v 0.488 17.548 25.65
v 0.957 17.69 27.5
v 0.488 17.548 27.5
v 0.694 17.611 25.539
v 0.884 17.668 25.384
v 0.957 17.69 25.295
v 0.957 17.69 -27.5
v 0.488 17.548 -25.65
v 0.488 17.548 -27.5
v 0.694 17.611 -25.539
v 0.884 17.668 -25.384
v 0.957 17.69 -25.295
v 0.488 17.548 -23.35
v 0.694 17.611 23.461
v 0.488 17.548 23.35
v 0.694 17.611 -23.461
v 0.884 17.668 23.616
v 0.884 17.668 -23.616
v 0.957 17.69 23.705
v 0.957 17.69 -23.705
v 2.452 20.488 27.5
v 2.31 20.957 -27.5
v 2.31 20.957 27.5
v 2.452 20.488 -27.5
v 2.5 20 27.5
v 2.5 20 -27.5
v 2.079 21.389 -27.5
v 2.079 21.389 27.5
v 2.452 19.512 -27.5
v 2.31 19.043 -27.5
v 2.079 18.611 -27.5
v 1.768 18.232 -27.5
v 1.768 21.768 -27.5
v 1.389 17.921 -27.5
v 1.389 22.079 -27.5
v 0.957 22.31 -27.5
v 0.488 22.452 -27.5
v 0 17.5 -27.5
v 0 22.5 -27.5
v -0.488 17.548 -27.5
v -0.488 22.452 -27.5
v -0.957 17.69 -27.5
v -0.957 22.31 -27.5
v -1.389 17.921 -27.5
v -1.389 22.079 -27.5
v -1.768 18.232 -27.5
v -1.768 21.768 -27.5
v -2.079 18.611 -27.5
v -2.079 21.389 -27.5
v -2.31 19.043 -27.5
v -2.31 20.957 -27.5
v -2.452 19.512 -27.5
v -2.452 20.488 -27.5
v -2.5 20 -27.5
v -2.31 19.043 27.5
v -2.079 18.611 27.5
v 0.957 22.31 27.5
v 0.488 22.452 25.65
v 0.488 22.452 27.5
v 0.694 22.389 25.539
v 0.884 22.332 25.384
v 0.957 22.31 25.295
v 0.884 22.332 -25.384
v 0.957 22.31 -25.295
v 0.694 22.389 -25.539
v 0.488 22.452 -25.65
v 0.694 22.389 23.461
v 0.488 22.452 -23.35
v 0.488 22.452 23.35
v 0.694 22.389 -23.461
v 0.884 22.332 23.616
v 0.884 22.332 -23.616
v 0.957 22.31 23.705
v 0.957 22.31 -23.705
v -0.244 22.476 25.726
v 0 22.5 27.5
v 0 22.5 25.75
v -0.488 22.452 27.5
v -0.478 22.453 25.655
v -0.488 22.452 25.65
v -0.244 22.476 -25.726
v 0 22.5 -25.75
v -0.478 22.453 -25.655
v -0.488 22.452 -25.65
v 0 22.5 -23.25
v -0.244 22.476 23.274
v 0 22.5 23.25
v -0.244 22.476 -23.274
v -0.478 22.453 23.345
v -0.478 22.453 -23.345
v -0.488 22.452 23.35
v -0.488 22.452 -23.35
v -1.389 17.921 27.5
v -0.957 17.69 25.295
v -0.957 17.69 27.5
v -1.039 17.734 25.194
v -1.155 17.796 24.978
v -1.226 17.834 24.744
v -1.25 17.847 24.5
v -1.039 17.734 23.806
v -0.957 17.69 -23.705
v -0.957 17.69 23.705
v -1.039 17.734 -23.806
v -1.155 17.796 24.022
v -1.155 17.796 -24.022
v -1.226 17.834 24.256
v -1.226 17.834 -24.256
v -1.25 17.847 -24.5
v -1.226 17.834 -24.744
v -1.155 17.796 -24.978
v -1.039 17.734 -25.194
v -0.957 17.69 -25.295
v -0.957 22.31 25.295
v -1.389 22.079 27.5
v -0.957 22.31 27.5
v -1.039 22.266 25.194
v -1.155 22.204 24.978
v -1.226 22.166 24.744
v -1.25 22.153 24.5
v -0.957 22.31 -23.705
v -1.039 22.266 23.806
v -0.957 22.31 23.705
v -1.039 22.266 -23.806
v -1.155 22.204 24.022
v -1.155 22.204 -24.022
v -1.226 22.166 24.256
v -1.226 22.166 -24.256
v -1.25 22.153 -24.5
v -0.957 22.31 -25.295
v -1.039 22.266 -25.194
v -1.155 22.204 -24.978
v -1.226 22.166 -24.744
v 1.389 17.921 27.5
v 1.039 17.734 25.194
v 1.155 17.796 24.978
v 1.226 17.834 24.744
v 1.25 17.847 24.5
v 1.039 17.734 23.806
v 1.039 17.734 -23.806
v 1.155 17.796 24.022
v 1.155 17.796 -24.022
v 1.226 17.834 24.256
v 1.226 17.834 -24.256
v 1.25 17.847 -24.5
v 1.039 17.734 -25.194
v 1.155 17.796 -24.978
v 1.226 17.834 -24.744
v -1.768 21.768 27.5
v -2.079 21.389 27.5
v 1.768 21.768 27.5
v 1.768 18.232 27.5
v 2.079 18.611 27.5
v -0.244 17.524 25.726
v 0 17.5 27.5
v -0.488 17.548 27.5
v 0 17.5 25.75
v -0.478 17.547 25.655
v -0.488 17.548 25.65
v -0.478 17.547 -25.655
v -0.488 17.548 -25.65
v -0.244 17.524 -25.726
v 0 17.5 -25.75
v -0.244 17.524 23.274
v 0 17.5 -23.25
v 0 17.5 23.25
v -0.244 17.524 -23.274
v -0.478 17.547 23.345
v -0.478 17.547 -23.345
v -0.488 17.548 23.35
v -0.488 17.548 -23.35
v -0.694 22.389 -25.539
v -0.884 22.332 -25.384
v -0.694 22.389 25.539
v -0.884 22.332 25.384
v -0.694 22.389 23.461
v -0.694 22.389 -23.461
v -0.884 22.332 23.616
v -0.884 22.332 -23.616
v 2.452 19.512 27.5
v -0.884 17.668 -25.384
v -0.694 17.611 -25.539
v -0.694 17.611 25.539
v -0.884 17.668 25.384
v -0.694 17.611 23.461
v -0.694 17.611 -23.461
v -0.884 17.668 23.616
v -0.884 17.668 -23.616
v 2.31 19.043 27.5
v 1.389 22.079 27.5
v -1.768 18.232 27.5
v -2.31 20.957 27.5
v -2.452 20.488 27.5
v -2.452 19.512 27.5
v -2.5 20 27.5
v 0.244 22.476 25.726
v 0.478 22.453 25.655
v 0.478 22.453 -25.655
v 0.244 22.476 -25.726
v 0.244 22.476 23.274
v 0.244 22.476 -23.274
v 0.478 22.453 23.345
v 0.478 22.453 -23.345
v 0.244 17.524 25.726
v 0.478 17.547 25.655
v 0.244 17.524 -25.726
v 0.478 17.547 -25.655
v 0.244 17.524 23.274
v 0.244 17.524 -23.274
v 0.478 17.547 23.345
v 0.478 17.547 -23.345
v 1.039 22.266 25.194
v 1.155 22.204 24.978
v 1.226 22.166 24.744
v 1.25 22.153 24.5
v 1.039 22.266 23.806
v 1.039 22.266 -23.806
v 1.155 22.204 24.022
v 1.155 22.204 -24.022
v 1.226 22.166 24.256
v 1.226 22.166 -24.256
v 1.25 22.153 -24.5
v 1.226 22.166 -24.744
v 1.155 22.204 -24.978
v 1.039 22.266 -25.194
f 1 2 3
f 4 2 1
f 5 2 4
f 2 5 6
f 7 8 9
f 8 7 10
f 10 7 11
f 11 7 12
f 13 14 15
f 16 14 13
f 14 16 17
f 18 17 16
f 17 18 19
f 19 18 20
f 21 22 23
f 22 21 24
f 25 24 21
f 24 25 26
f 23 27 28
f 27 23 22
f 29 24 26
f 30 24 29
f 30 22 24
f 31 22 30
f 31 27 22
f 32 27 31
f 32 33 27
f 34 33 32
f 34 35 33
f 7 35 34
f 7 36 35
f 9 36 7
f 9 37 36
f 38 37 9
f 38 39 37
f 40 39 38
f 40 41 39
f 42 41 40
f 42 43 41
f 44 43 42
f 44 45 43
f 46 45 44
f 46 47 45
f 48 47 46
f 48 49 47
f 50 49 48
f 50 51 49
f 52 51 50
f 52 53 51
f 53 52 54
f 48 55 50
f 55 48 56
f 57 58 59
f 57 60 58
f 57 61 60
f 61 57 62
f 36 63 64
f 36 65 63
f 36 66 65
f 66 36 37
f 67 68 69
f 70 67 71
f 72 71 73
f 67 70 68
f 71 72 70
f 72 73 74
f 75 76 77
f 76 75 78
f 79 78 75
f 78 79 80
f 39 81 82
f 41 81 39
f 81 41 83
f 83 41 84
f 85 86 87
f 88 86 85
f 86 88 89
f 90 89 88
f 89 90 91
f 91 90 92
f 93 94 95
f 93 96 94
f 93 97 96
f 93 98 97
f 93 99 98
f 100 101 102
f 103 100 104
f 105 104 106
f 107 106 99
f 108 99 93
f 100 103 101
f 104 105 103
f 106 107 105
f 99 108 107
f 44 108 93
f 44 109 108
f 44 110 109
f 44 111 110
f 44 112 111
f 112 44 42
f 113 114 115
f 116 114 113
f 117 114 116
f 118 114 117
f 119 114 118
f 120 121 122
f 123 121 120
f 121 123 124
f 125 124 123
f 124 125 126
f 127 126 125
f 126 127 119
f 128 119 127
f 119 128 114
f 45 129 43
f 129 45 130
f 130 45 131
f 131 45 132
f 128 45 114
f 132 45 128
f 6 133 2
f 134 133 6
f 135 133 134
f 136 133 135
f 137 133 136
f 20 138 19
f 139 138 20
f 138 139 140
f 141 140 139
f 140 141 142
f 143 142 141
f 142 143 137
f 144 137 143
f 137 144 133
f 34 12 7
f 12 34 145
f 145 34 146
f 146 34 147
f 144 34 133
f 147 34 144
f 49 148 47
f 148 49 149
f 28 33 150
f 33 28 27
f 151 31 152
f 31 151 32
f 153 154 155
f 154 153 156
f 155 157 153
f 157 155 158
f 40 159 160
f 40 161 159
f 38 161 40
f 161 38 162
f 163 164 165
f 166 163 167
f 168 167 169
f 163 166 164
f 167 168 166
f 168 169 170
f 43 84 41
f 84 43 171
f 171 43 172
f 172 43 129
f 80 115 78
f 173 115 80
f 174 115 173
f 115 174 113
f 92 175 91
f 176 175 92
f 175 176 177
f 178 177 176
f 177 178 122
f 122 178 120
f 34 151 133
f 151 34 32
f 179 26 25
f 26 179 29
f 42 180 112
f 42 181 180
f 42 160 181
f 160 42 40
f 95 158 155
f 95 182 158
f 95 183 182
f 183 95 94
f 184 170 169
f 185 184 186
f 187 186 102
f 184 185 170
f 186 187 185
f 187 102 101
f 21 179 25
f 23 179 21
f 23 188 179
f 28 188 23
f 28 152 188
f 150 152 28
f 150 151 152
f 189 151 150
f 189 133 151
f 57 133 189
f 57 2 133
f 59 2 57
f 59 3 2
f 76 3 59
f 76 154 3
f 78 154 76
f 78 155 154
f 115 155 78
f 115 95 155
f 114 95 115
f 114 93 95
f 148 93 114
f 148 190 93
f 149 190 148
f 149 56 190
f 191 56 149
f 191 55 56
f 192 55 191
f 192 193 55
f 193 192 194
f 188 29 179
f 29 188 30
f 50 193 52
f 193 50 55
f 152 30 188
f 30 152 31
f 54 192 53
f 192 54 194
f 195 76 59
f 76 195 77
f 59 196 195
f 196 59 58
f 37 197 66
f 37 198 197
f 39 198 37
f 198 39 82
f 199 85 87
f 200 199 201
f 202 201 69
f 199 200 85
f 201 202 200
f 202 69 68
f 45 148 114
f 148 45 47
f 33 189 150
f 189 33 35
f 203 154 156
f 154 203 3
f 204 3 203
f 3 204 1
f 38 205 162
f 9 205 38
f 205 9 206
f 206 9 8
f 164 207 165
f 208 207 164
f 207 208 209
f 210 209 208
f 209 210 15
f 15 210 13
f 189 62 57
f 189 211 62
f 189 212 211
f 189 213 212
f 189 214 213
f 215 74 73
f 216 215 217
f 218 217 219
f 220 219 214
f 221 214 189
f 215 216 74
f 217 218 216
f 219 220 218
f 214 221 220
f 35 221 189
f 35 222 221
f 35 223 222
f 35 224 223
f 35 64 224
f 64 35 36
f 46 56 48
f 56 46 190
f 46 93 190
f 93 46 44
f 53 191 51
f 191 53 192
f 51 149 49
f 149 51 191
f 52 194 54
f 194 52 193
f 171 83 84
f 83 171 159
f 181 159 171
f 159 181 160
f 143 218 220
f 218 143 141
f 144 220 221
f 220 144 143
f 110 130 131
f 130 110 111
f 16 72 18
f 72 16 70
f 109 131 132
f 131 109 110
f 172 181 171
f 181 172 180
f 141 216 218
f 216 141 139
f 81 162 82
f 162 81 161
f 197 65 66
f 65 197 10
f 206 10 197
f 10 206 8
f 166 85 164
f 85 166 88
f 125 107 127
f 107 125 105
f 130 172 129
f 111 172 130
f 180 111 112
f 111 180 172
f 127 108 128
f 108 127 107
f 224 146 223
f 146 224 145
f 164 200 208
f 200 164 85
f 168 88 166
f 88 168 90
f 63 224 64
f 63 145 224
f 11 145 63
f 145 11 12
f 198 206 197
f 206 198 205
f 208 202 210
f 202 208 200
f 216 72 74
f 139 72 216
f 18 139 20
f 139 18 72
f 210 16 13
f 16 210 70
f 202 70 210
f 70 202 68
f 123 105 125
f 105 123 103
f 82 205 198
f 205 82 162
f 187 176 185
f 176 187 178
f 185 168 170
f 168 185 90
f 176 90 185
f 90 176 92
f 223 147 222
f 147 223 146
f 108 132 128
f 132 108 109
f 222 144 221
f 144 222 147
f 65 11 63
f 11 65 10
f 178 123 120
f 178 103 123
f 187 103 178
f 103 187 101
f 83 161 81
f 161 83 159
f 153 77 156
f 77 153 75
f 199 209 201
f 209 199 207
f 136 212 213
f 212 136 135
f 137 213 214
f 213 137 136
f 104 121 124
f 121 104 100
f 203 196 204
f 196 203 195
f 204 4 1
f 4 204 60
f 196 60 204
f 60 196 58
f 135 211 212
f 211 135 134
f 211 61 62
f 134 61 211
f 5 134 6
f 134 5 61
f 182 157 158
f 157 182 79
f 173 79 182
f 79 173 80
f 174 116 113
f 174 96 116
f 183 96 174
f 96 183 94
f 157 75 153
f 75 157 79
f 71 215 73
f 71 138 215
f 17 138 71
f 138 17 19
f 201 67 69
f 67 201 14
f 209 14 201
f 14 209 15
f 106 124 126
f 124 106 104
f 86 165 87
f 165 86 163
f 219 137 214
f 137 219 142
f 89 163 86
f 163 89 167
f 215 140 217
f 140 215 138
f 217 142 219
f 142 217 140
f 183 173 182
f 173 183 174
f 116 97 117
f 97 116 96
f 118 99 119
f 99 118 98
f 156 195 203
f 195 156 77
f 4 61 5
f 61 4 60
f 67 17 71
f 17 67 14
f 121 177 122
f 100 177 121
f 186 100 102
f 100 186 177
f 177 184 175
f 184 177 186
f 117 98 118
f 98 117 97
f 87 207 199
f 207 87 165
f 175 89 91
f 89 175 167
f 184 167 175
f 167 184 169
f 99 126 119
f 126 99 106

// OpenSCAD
use <MCAD/involute_gears.scad>
use <Thread_Library_Throated.scad>

fn=32;
fs=0.9;
pitch = 150;
pin_d = 3.5;
module motor() {
    union() {
        cylinder(r=35.5/2, h=50, $fs= fs);
        cylinder(r=3.175/2, h=68, $fs= fs);
    }
}
module pinion() {
    $fs=1;
    difference() {
        union() {

            translate([0,0,9.5]) gear (number_of_teeth=15, circular_pitch=pitch,gear_thickness = 9,rim_thickness = 9,hub_thickness = 9,bore_diameter=pin_d,circles=0, $fs= fs);
            hollow_cyl(d=3.2, w=4, h=9.5);
        }
        translate([-10,0,9/2]) rotate([0,90,0]) cylinder(d=2.9, h=20);
    }
}
module gears_1() {
    union() {
    gear (number_of_teeth=49, circular_pitch=pitch,
        gear_thickness = 8,
        rim_thickness = 8,
        hub_thickness = 8,
        bore_diameter=pin_d,
        circles=2, $fs= fs);
    translate([0,0,8]) gear (number_of_teeth=15, circular_pitch=pitch,
        gear_thickness = 9,
        rim_thickness = 9,
        hub_thickness = 9,
        bore_diameter=pin_d,
        circles=2, $fs= fs);
    }    
}
module gears_2() {
    union() {
    gear (number_of_teeth=40, circular_pitch=pitch,
        gear_thickness = 8,
        rim_thickness = 8,
        hub_thickness = 8,
        bore_diameter=pin_d,
        circles=6, $fs= fs);
    translate([0,0,8]) gear (number_of_teeth=15, circular_pitch=pitch,
        gear_thickness = 9+6,
        rim_thickness = 9+6,
        hub_thickness = 9+6,
        bore_diameter=pin_d,
        circles=2, $fs= fs);
    }    
}
module gears_3() {
    union() {
    gear (number_of_teeth=40, circular_pitch=pitch,
        gear_thickness = 8,
        rim_thickness = 8,
        hub_thickness = 8,
        bore_diameter=pin_d,
        circles=2, $fs= fs);
    translate([0,0,8]) gear (number_of_teeth=15, circular_pitch=pitch,
        gear_thickness = 17,
        rim_thickness = 17,
        hub_thickness = 17,
        bore_diameter=pin_d,
        circles=2, $fs= fs);
    }    
}
module diffgear() {
    difference() {
        gear (number_of_teeth=40, circular_pitch=pitch,        gear_thickness = 16,        rim_thickness = 16,        hub_thickness = 16,        bore_diameter=6.2,        circles=0, $fn=fn);
        diff_arms_cut();
    }
}
module pinholder() {
    difference() {
        cylinder(d=pin_d+5, h=4, $fn=fn);
        cylinder(d=pin_d, h=4, $fn=fn);
    }
    
}
module pinholder_cut() {
    
        translate([0,0,-0.5]) cylinder(d=pin_d, h=5, $fn=fn);

    
}
module pinholder_cut_6() {
        translate([0,0,-0.5]) cylinder(d=6, h=5, $fn=fn);
}
module Bholder() {
    difference() {
        cylinder(d=15+4, h=4, $fn=fn);
        cylinder(d=15, h=4, $fn=fn);
    }
    
}
module Bholder_cut() {
    
        cylinder(d=15, h=4, $fn=fn);

    
}
avst = 16.6667+6.25;
avst2 = 20.4167+6.25;
module all_gears() {
avst = 16.6667+6.25;
avst2 = 20.4167+6.25;

%translate([0,0,-8]) gear (number_of_teeth=15, circular_pitch=pitch,
        gear_thickness = 8,
        rim_thickness = 8,
        hub_thickness = 8,
        bore_diameter=3.175,
        circles=2, $fn=fn);

translate([avst2,0,0]) rotate([0,180,0]) gears_1(); // /3.333 // gear1
translate([avst2,avst,-9])rotate([0,180,0]) gears_2(); // 8.66 // gear2
translate([avst2,avst,-9-9-5]) rotate([0,180,-45]) translate([avst,0,0]) gears_3();   // 22.5
translate([avst2-avst,avst,-9-9-9-5]) rotate([0,180,-45]) translate([avst,0,0]) diffgear();                           // 58.5866666667 

//translate([avst2-avst,avst,-9-9-9-5 +55/2 -16/2]) rotate([0,180,-45]) translate([avst,0,0]) %cylinder(d=10, h = 55);
    
    translate([avst2-avst,avst,-9-9-9-5 +6.1 -16/2]) rotate([0,180,-45]) translate([avst,0,0]) rotate([0,180,0]) diff_arms();
    translate([avst2-avst,avst,-9-9-9-5 -6.1-2 -16/2]) rotate([0,180,-45]) translate([avst,0,0]) rotate([0,0,0]) diff_arms();
}
module holder() {
    $fs= 0.9;
    //baseplate
    difference() {
        translate([5,55,-60]) cube([25,3,65]);
        //material saving
        //translate([15,200,-(17-4)/2]) rotate([90,0,0]) cylinder(d=17-4, h=400); 
        //translate([15,200,-(50-4)/2-(17-4)/2-2]) rotate([90,0,0]) cylinder(d=50-4-17-4, h=400);
        translate([avst2,avst,-9-9-4]) rotate([0,180,-45]) translate([avst,0,0]) cylinder(r= 16.6667+1.5, h= 10);
    }
    hull() {
        translate([1.5,55-25,-60-2.5+1]) cube([1.5,25+3,1.5]);
        translate([7,55-25,-53]) cube([1.5,25+3,1.5]);
    }
    translate([-4.5,53,-66]) cube([8,5,6]);
    translate([-4.5,53,-20]) cube([8,5,6]);
    p1off = 0;
    difference() {
        hull() {
            translate([avst2,0,0])pinholder();
            translate([avst2,avst,0])pinholder();
            //translate([avst2,avst,0+4]) rotate([0,180,-45]) translate([avst,0,0]) pinholder();
            translate([0,55,0]) cube([30,3,4]);
        
        }
        translate([avst2,0,0])pinholder_cut();
        translate([avst2,avst,0])pinholder_cut();
        translate([avst2,avst,0+4]) rotate([0,180,-45]) translate([avst,0,0]) pinholder_cut_6();
    }
    p2off = 22;
    difference() {
        hull() {
            translate([avst2,0,-22])pinholder();
            translate([avst2,avst,-22+4]) rotate([0,180,-45]) translate([avst,0,0]) pinholder();
            //translate([avst2-avst,avst,-22+4]) rotate([0,180,-45]) translate([avst,0,0]) Bholder();

            translate([0,55,-22]) cube([30,3,4]);
            translate([0,0,-22]) cylinder(d=35, h=4);
        }
        translate([avst2,0,-22])pinholder_cut();
        translate([avst2,avst,-22+4]) rotate([0,180,-45]) translate([avst,0,0]) pinholder_cut();
        //translate([avst2-avst,avst,-22+4]) rotate([0,180,-45]) translate([avst,0,0]) Bholder_cut();
        translate([0,0,-22]) motor_cut();
        hull() {
            translate([avst2,avst,-22+4])rotate([0,180,0]) cylinder(d=18, h=4);
            translate([avst2+25,avst,-22+4])rotate([0,180,0]) cylinder(d=18, h=4);
        }
        translate([avst2-avst,avst,-p2off+2]) rotate([0,180,-45]) translate([avst,0,0]) cylinder(d=30, h=3);
        translate([avst2-avst,avst,-p2off+5]) rotate([0,180,-45]) translate([avst,0,0]) cylinder(d=15.5+3*2, h=3);
        // screw mount cuts
        translate([avst2-avst,avst,-60+46]) rotate([0,180,-45]) translate([avst,0,0]) rotate([0,0,-45-180]) mount2_gb_cut();
    translate([avst2-avst,avst,-60+46]) rotate([0,180,-45]) translate([avst,0,0]) rotate([0,0,-45-180]) mirror([0,1,0]) mount2_gb_cut();
        
    }
    p3off = 37;
    difference() {
        hull() {
            //translate([avst2,0,0])pinholder();
            translate([avst2,avst,-37])pinholder();
            //translate([avst2,avst,0+4]) rotate([0,180,-45]) translate([avst,0,0]) pinholder();
            translate([17,55,-37]) cube([13,3,4]);
        
        }
        translate([avst2,0,-37])pinholder_cut();
        translate([avst2,avst,-37])pinholder_cut();
        //translate([avst2,avst,0+4]) rotate([0,180,-45]) translate([avst,0,0]) pinholder_cut();
    }
    p4off = 53;
    difference() {
        hull() {
            //translate([avst2,0,-p4off])pinholder();
            //translate([avst2,avst,-p4off])pinholder();
            translate([avst2,avst,-p4off+4]) rotate([0,180,-45]) translate([avst,0,0]) pinholder();
            //translate([avst2-avst,avst,-p4off+4]) rotate([0,180,-45]) translate([avst,0,0]) Bholder();
            translate([10,55,-p4off]) cube([20,3,4]);
        }
        translate([avst2,0,-p4off])pinholder_cut();
        translate([avst2,avst,-p4off])pinholder_cut();
        translate([avst2,avst,-p4off+4]) rotate([0,180,-45]) translate([avst,0,0]) pinholder_cut();
        //translate([avst2-avst,avst,-p4off+4]) rotate([0,180,-45]) translate([avst,0,0]) Bholder_cut();
        //translate([0,0,-100]) cylinder(d=40, h=200);
    }
    
    // screw mounts
    translate([avst2-avst,avst,-60+46]) rotate([0,180,-45]) translate([avst,0,0]) rotate([0,0,-45-180]) mount2_gb();
    translate([avst2-avst,avst,-60+46]) rotate([0,180,-45]) translate([avst,0,0]) rotate([0,0,-45-180]) mirror([0,1,0]) mount2_gb();
    
    translate([avst2-avst,avst,-60]) rotate([0,180,-45]) translate([avst,0,0]) rotate([0,0,-45-180]) mount2_gb();
    translate([avst2-avst,avst,-60]) rotate([0,180,-45]) translate([avst,0,0]) rotate([0,0,-45-180]) mirror([0,1,0]) mount2_gb();
    
}
module motor_cut() {
    $fs= 0.9;
    rotate([0,0,0]) translate([0,0,0])  union() {
        translate([0,-25/2,0]) cylinder(d=3, h=4, $fn=32);
        translate([0,25/2,0]) cylinder(d=3, h=4, $fn=32);
        hull() {
            translate([0,0,0]) cylinder(d=13, h=4);
            //translate([10,1.5+25/2,0]) cylinder(d=13, h=4);
        }
    }
}


module sakura_axle() {
    $fs= 0.9;
    sphere(d=6);
    translate([0,5,0]) rotate([90,0,0]) cylinder(d=2, h=10);
    cylinder(d=3.15, h=44);
    translate([0,5,44]) rotate([90,0,0]) cylinder(d=2, h=10);
    translate([0,0,44]) cylinder(d=10, h=3);
    translate([0,0,44+3]) cylinder(d1=10, d2=7, h=1.5);
    translate([0,5,44+15.5]) rotate([90,0,0]) cylinder(d=2, h=10);
    translate([0,0,44]) cylinder(d=5, h=17.5);
    translate([0,0,44]) cylinder(d=3,85, h=30);
}
module hollow_cyl(d, w, h) {
    $fs= 0.9;
    difference() {
        cylinder(d=d+w*2, h=h);
        translate([0,0,-1])cylinder(d=d, h=h+2);
    }
}
module hollow_cyl2(d1, d2, w, h) {
    $fs= 0.9;
    difference() {
        cylinder(d1=d1+w*2, d2=d2+w*2, h=h);
        translate([0,0,0])cylinder(d1=d1,d2=d2, h=h);
        //translate([0,0,-1])cylinder(d=d2, h=h+2);
    }
}
module hollow_cyl3(d1, d2, w, h) {
    $fs= 0.9;
    difference() {
        cylinder(d1=d1+w*2, d2=d2+w*2, h=h);
        
        translate([0,0,-1]) cylinder(d=d2, h=h+2);
    }
}
module mount() {
    $fs= 0.9;
    x = 8;
    y= 15;
    z = 4;
    $fs= 0.9;
    difference() {
        cube([x,y,z]);
        translate([x/2,y-3,-1]) cylinder(d=3,h=z+2);
        translate([0,0,-1]) cylinder(d=12,h=z+2);
    }
}
module mount2() {
    $fs= 0.9;
    x = 8;
    y= 15;
    z = 6;
    $fs= 0.9;
    difference() {
        cube([x,y,z]);
        translate([0,y-3,z/2]) rotate([0,90,0]) cylinder(d=3,h=z+2);
        translate([0,0,-1]) cylinder(d=16,h=z+2);
    }
}
module mount2_gb() {
    $fs= 0.9;
    x = 8;
    y= 15;
    z = 6;
    $fs= 0.9;
    difference() {
        translate([x,0,0]) cube([x,y,z]);
        translate([x,y-3,z/2]) rotate([0,90,0]) cylinder(d=3,h=z+3);
        translate([0,0,-1]) cylinder(d=15.5+3*2+0,h=z+2);
    }
}
module mount2_gb_cut() {
    x = 8;
    y= 15;
    z = 6;
    $fs= 0.9;

    translate([x,y-3,z/2]) rotate([0,90,0]) cylinder(d=3,h=z+2+20);
    translate([x,y-3,z/2]) rotate([0,90,0]) cylinder(d=6,h=z+2+10);

}
//mount();
module axle1() {
    $fs= 0.9;
    hollow_cyl(d=38, h=10, w=3);
    translate([0,0,10]) hollow_cyl2(d1=38, d2=15, h=10, w=3);
    translate([0,0,20-2]) hollow_cyl3(d1=15,d2=12, h=2, w=3);
    color("red") translate([0,0,20]) hollow_cyl(d=15.5, h=4.5, w=3);
    translate([0,0,20+4.5]) hollow_cyl3(d1=15,d2=12, h=4.5, w=3);
    difference() {
        translate([0,0,20+4.5+4.5]) hollow_cyl(d=12, h=30, w=3);
        translate([-50,0,20+4.5+4.5+30-5]) rotate([0,90,0]) cylinder(d=3, h=100);
    }
    translate([0,0,40]) mount();
    translate([0,0,40]) mirror([0,1,0]) mount();
    
    translate([0,0,40]) mirror([1,0,0]) mount();
    translate([0,0,40]) mirror([0,1,0]) mirror([1,0,0]) mount();
    
    translate([0,0,20]) mount2();
    translate([0,0,20]) mirror([0,1,0]) mount2();
    
    translate([0,0,20]) mirror([1,0,0]) mount2();
    translate([0,0,20]) mirror([0,1,0]) mirror([1,0,0]) mount2();
    
    
    translate([0,0,45/2]) %sakura_axle();
}
module under_axle() {
    difference() {
        union() {
            axle1();
            mirror([0,0,1])axle1();
            translate([0,0,190/2-15]) rotate([180,0,0])  %solid_adapter();
            translate([0,0,-190/2+15]) mirror([0,0,1]) rotate([180,0,0])  %turn_adapter();
        }
        translate([0,-100,-100]) cube([200,200,200]);
    }
}
module cover (){
    difference() {
        union() {
            // bearing mount
            translate([20,18,0]) rotate([90,0,0]) hollow_cyl(d=10.5, w=4, h=5);
            translate([20,18+1,0]) rotate([90,0,0]) hollow_cyl(d=9.5, w=3, h=1);
            translate([20,18-5,0]) rotate([90,0,0]) hollow_cyl(d=9.5, w=3, h=1);
            translate([20,-18+5,0]) rotate([90,0,0]) hollow_cyl(d=10.5, w=4, h=5);
            translate([20,-18+5+1,0]) rotate([90,0,0]) hollow_cyl(d=9.5, w=3, h=1);
            translate([20,-18+5-5,0]) rotate([90,0,0]) hollow_cyl(d=9.5, w=3, h=1);
            // screw mount
            dist = 12;
            dist_y = 13;
            hole = 3.3;
            translate([20,dist_y,dist]) rotate([0,90,0]) hollow_cyl(d=hole, w=3, h=5);
            translate([20,-dist_y,dist]) rotate([0,90,0]) hollow_cyl(d=hole, w=3, h=5);
            translate([20,-dist_y,-dist]) rotate([0,90,0]) hollow_cyl(d=hole, w=3, h=5);
            translate([20,dist_y,-dist]) rotate([0,90,0]) hollow_cyl(d=hole, w=3, h=5);
            
            // cover
            translate([20,15,0]) rotate([90,0,0]) hollow_cyl(d= 17, w=2, h= 30);
            
            
        }
        // gear cut
        translate([20,12-1,0]) rotate([90,0,0]) cylinder(d= 15.5, h= 23);
        
        //translate([16.6667+6.25,0,-15])cylinder(r= 6.25+1.5, h= 25);
        //translate([16.6667+6.25,0,8])cylinder(r= 16.6667+1.5, h= 10);
        // bearing cut
        translate([20,18,0]) rotate([90,0,0]) cylinder(d= 10.5, h= 5);
        
        // cover cut
        translate([20-100,-50,-50]) cube(100);
    }
}
module up_axle() {
    difference() {
        union() {
            axle1();
            mirror([0,0,1])axle1();
            // bearing mount
            translate([20,18,0]) rotate([90,0,0]) hollow_cyl(d=10.5, w=3, h=5);
            translate([20,18+1,0]) rotate([90,0,0]) hollow_cyl(d=9.5, w=3, h=1);
            translate([20,18-5,0]) rotate([90,0,0]) hollow_cyl(d=9.5, w=3, h=1);
            translate([20,-18+5,0]) rotate([90,0,0]) hollow_cyl(d=10.5, w=3, h=5);
            translate([20,-18+5+1,0]) rotate([90,0,0]) hollow_cyl(d=9.5, w=3, h=1);
            translate([20,-18+5-5,0]) rotate([90,0,0]) hollow_cyl(d=9.5, w=3, h=1);
            // screw mount
            dist = 12;
            dist_y = 13;
            hole = 2.8;
            h = 8;
            translate([20-h,dist_y,dist]) rotate([0,90,0]) hollow_cyl(d=hole, w=3, h=h);
            translate([20-h,-dist_y,dist]) rotate([0,90,0]) hollow_cyl(d=hole, w=3, h=h);
            translate([20-h,-dist_y,-dist]) rotate([0,90,0]) hollow_cyl(d=hole, w=3, h=h);
            translate([20-h,dist_y,-dist]) rotate([0,90,0]) hollow_cyl(d=hole, w=3, h=h);
            
        }
        translate([-200,-100,-100]) cube([200,200,200]);
        
        
        // gear cut
        translate([20,12,0]) rotate([90,0,0]) cylinder(d= 15.5, h= 24);
        
        //translate([16.6667+6.25,0,-15])cylinder(r= 6.25+1.5, h= 25);
        //translate([16.6667+6.25,0,8])cylinder(r= 16.6667+1.5, h= 10);
        // bearing cut
        translate([20,17,0]) rotate([90,0,0]) cylinder(d= 9.5, h= 40);
        translate([20,18,0]) rotate([90,0,0]) cylinder(d= 10.5, h= 5);
        translate([20,-18+5,0]) rotate([90,0,0]) cylinder(d= 10.5, h= 5);
        
        // cover cut
        translate([20,-50,-50]) cube(100);
        
        // screw mount screw holes
            dist = 12;
            dist_y = 13;
            hole = 2.8;
            h = 20;
            translate([20-h,dist_y,dist]) rotate([0,90,0]) cylinder(d=hole, h=h);
            translate([20-h,-dist_y,dist]) rotate([0,90,0]) cylinder(d=hole, h=h);
            translate([20-h,-dist_y,-dist]) rotate([0,90,0]) cylinder(d=hole, h=h);
            translate([20-h,dist_y,-dist]) rotate([0,90,0]) cylinder(d=hole, h=h);
        
    }
}
module solid_adapter() {
    $fs= 0.9;
    hollow_cyl(d=5.5, w=4, h=4);
    color("cyan")translate([0,0,4]) %hollow_cyl(d=5, w=5/2, h=4);
    translate([0,0,4]) hollow_cyl(d=10.5, w=3, h=4);
    translate([0,0,4+4]) hollow_cyl2(d1=12, d2=12+3+3+1, w=2, h=13);
    difference() {
        translate([0,0,4+4+13]) hollow_cyl(d=12+3+3+1, w=2, h=10);
        translate([-50,0,4+4+13+5]) rotate([0,90,0]) cylinder(d=3, h=100);
    }
}
module turn_arm() {
    $fs= 0.5;
    hm = 20.5;
    difference() {
        union() {
            hollow_cyl(d=10.5, w=2, h=10);
            hollow_cyl(d=5.5, w=3, h=5);
            translate([0, 0, 8])  hollow_cyl2(d1=10.5, d2=12, w=2, h=2); // strength
            translate([0, 0, 10])  hollow_cyl(d=12, w=2, h=4);
            translate([-hm/2, 0, 14]) rotate([0,90,0]) cylinder(d=7, h=hm);
        }
        translate([-15, 0, 14]) rotate([0,90,0]) cylinder(d=2.85, h=30);
        translate([0, 0, 10])  cylinder(d=12, h=10);
    }
    difference() {
        hull() {
            translate([-5/2,6,0]) cube([5,1,10]);
            translate([-5/2,26,22]) rotate([0,90,0]) hollow_cyl(d=3, w=2, h=5);
        }
        translate([-5/2,26,22]) rotate([0,90,0]) cylinder(d=3, h=5);
    }
}
module turn_hub() {
    $fs= 0.9;
    hm = 20.5;
    difference() {
        union() {
            translate([0,0,4+4+13]) hollow_cyl(d=12+3+3+1, w=2, h=10);
            hull() {
                translate([-hm/2-1.2/2-3, 0, 14]) rotate([0,90,0]) cylinder(d=7, h=3);
                translate([-hm/2-1.2/2-3, 0, 4+4+13+5]) rotate([0,90,0]) cylinder(d=7, h=3);
            }
            hull() {
                translate([hm/2+1.2/2 , 0, 14]) rotate([0,90,0]) cylinder(d=7, h=3);
                translate([hm/2+1.2/2 , 0, 4+4+13+5]) rotate([0,90,0]) cylinder(d=7, h=3);
            }
        }
        translate([-50,0,4+4+13+5]) rotate([0,90,0]) cylinder(d=3, h=100);
        translate([-50,0,14]) rotate([0,90,0]) cylinder(d=3, h=100);
    }
    
    
}
module turn_adapter() {
    turn_arm();
    turn_hub();
}
module diff_arms() {
    $fs= 0.9;
    x = 20;
    ah = 45/2;
    slice = 2;
    difference() {
        union() {
            translate([-x/2, -x/2, 0]) cube([x,x,2]);
            cylinder(d=9.7, h= ah);
        }
        translate([0, 0, 10])cylinder(d=6.3, h= ah);
        translate([-slice/2, -10/2, 10]) cube([slice,10,20]);
        translate([0, 0, -5]) diff_arms_cut();
    }
}
module diff_arms_cut() {
    $fs= 0.9;
    x = 21;
    l = 5+3/2+3;
    rotate([0,0,45]) union() {
        translate([l, 0, -20])cylinder(d=3, h= 50);
        translate([-l, 0, -20])cylinder(d=3, h= 50);
        translate([0, l, -20])cylinder(d=3, h= 50);
        translate([0, -l, -20])cylinder(d=3, h= 50);
    }
    translate([-x/2, -x/2, 0]) cube([x,x,3.5]);

}

module theworm() {
    worm_rak();
    ll = 55;
    difference() {
        translate([0,20,-ll/2]) rotate([0,0,0]) cylinder(d=5, h = ll, $fn=32);
        translate([0,20+10,-ll/2+3]) rotate([90,0,0]) cylinder(d=2.5, h = ll, $fn=32);
        translate([0,20+10,ll/2-3]) rotate([90,0,0]) cylinder(d=2.5, h = ll, $fn=32);
    }
}


module worm_rak() {
    numberTeeth=25;
    pitchRadius=15;
    thickness=10;


    length=25;
    radius=5;
    pitch=2*3.1415*pitchRadius/numberTeeth;

    angle=-360*$t;
    offset=4;

    distance=radius+pitchRadius+0.0*pitch;

//difference()
{

//cube([thickness-1,thickness,length],true);

    translate([0,20,0]) {
        translate([0,0,-length/2]) rotate([0,0,180+angle]) trapezoidThread( 
            length=length, 			// axial length of the threaded rod
            pitch=pitch,				 // axial distance from crest to crest
            pitchRadius=radius, 		// radial distance from center to mid-profile
            threadHeightToPitch=0.5, 	// ratio between the height of the profile and the pitch
						// std value for Acme or metric lead screw is 0.5
            profileRatio=0.5,			 // ratio between the lengths of the raised part of the profile and the pitch
						// std value for Acme or metric lead screw is 0.5
            threadAngle=20, 			// angle between the two faces of the thread
						// std value for Acme is 29 or for metric lead screw is 30
            RH=true, 				// true/false the thread winds clockwise looking along shaft, i.e.follows the Right Hand Rule
            clearance=0.2, 			// radial clearance, normalized to thread height
            backlash=0.06, 			// axial clearance, normalized to pitch
            stepsPerTurn=24 			// number of slices to create per turn
        );

        /*
        translate([-thickness/2,-distance,0])
        rotate([0,90,0])
        rotate([0,0,offset-angle/numberTeeth])
         %gear ( 
            number_of_teeth=numberTeeth,
            circular_pitch=360*pitchRadius/numberTeeth,
            pressure_angle=20,
            clearance = 0,
            gear_thickness=thickness,
            rim_thickness=thickness,
            rim_width=5,
            hub_thickness=thickness,
            hub_diameter=10,
            bore_diameter=5,
            circles=0,
            backlash=0.1,
            twist=-pitchRadius/radius,
            involute_facets=0,
            flat=false);
            */
    }
}
    
}
module worm() {
// #############Worm gear



numberTeeth=25;
pitchRadius=15;
thickness=10;
$fs = 1;

radius=7;
pitch=2*3.14159*pitchRadius/numberTeeth;

length=pitch*6;
position=length/2;

angle=-360*$t;
offset=1;

distance=radius+pitchRadius-0.5*pitch;

translate([0,20,0]){
    translate([0,0,-position])rotate([0,0,180+angle])trapezoidThreadThroated( 
        length=length, 			// axial length of the threaded rod
        pitch=pitch,				// axial distance from crest to crest
        pitchRadius=radius, 		// radial distance from center to mid-profile
        throatDistance=distance, 	// radial distance to center of curvature of throat 
        throatRadius=pitchRadius, 	// radius of curvature of throat
        throatHeight=position,		// axial distance to center of curvature of throat
        threadHeightToPitch=0.5, 	// ratio between the height of the profile and the pitch
                            // std value for Acme or metric lead screw is 0.5
        profileRatio=0.5,			// ratio between the lengths of the raised part of the profile and the pitch
                            // std value for Acme or metric lead screw is 0.5
        threadAngle=22.5, 			// angle between the two faces of the thread
                            // std value for Acme is 29 or for metric lead screw is 30
        RH=true, 				// true/false the thread winds clockwise looking along shaft, i.e.follows the Right Hand Rule
        clearance=0.3, 			// radial clearance, normalized to thread height
        backlash=0.1, 			// axial clearance, normalized to pitch
        stepsPerTurn=24,			// number of slices to create per turn
        showVertices=false
	);


    //translate([-thickness/2,-distance,0])rotate([0,90,0])rotate([0,0,offset-angle/numberTeeth]) gear ( number_of_teeth=numberTeeth,circular_pitch=(360*pitchRadius/numberTeeth),pressure_angle=22.5,clearance = 0.2, gear_thickness=thickness,  rim_thickness=thickness, rim_width=5, hub_thickness=thickness,  hub_diameter=10, bore_diameter=5, circles=0, backlash=0.1, twist=-pitchRadius/radius,involute_facets=0,flat=false);
};
}
module wormdiff() {
// #############Worm gear



numberTeeth=25;
pitchRadius=15;
thickness=10;
$fs = 1;

radius=7;
pitch=2*3.14159*pitchRadius/numberTeeth;

length=pitch*6;
position=length/2;

angle=-360*$t;
offset=1;

distance=radius+pitchRadius-0.5*pitch;

translate([0,20,0]){
    translate([0,0,-position])rotate([0,0,180+angle])%trapezoidThreadThroated( 
        length=length, 			// axial length of the threaded rod
        pitch=pitch,				// axial distance from crest to crest
        pitchRadius=radius, 		// radial distance from center to mid-profile
        throatDistance=distance, 	// radial distance to center of curvature of throat 
        throatRadius=pitchRadius, 	// radius of curvature of throat
        throatHeight=position,		// axial distance to center of curvature of throat
        threadHeightToPitch=0.5, 	// ratio between the height of the profile and the pitch
                            // std value for Acme or metric lead screw is 0.5
        profileRatio=0.5,			// ratio between the lengths of the raised part of the profile and the pitch
                            // std value for Acme or metric lead screw is 0.5
        threadAngle=22.5, 			// angle between the two faces of the thread
                            // std value for Acme is 29 or for metric lead screw is 30
        RH=true, 				// true/false the thread winds clockwise looking along shaft, i.e.follows the Right Hand Rule
        clearance=0.3, 			// radial clearance, normalized to thread height
        backlash=0.1, 			// axial clearance, normalized to pitch
        stepsPerTurn=24,			// number of slices to create per turn
        showVertices=false
	);

difference() {
       translate([-thickness/2,-distance,0])rotate([0,90,0])rotate([0,0,offset-angle/numberTeeth]) gear ( number_of_teeth=numberTeeth,circular_pitch=(360*pitchRadius/numberTeeth),pressure_angle=22.5,clearance = 0.2, gear_thickness=thickness,  rim_thickness=thickness, rim_width=5, hub_thickness=thickness,  hub_diameter=10, bore_diameter=5, circles=0, backlash=0.1, twist=-pitchRadius/radius,involute_facets=0,flat=false);
        translate([-10,-20,0])rotate([0,90,0]) diff_arms_cut();
    }
        
};


// ####### End Worm gear ########

}
//rotate([90,0,0]) worm();
module display() {
    $fs= 1;
    translate([5,0,0])rotate([0,90,0]) diff_arms();
    //rotate([0,-90,0]) under_axle();

    //translate([0,ll/2,20]) rotate([90,0,0]) %cylinder(d=12, h = 10);
    rotate([0,-90,0]) up_axle();
    %rotate([0,-90,0]) cover();
    rotate([-90,0,0]) wormdiff();
    rotate([90,0,0])theworm();
    //axle1();
    //up_axle();
    //translate([0,0,190/2-15]) rotate([180,0,0]) %solid_adapter();
    //solid_adapter();
}
//display();
//turn_arm();
// ############################
// # Printer friendly
//rotate([180,90,0]) diffgear();
//translate([5,0,0])rotate([0,90,0]) diff_arms();
//rotate([0,90,0]) under_axle();
//rotate([0,-90,0]) up_axle();
//rotate([-90,0,0]) holder();
//turn_arm();
//rotate([0,180,0]) turn_hub();
//solid_adapter();
//pinion();
theworm();
//rotate([0,90,0]) wormdiff();
//rotate([0,-90,0])  cover();
